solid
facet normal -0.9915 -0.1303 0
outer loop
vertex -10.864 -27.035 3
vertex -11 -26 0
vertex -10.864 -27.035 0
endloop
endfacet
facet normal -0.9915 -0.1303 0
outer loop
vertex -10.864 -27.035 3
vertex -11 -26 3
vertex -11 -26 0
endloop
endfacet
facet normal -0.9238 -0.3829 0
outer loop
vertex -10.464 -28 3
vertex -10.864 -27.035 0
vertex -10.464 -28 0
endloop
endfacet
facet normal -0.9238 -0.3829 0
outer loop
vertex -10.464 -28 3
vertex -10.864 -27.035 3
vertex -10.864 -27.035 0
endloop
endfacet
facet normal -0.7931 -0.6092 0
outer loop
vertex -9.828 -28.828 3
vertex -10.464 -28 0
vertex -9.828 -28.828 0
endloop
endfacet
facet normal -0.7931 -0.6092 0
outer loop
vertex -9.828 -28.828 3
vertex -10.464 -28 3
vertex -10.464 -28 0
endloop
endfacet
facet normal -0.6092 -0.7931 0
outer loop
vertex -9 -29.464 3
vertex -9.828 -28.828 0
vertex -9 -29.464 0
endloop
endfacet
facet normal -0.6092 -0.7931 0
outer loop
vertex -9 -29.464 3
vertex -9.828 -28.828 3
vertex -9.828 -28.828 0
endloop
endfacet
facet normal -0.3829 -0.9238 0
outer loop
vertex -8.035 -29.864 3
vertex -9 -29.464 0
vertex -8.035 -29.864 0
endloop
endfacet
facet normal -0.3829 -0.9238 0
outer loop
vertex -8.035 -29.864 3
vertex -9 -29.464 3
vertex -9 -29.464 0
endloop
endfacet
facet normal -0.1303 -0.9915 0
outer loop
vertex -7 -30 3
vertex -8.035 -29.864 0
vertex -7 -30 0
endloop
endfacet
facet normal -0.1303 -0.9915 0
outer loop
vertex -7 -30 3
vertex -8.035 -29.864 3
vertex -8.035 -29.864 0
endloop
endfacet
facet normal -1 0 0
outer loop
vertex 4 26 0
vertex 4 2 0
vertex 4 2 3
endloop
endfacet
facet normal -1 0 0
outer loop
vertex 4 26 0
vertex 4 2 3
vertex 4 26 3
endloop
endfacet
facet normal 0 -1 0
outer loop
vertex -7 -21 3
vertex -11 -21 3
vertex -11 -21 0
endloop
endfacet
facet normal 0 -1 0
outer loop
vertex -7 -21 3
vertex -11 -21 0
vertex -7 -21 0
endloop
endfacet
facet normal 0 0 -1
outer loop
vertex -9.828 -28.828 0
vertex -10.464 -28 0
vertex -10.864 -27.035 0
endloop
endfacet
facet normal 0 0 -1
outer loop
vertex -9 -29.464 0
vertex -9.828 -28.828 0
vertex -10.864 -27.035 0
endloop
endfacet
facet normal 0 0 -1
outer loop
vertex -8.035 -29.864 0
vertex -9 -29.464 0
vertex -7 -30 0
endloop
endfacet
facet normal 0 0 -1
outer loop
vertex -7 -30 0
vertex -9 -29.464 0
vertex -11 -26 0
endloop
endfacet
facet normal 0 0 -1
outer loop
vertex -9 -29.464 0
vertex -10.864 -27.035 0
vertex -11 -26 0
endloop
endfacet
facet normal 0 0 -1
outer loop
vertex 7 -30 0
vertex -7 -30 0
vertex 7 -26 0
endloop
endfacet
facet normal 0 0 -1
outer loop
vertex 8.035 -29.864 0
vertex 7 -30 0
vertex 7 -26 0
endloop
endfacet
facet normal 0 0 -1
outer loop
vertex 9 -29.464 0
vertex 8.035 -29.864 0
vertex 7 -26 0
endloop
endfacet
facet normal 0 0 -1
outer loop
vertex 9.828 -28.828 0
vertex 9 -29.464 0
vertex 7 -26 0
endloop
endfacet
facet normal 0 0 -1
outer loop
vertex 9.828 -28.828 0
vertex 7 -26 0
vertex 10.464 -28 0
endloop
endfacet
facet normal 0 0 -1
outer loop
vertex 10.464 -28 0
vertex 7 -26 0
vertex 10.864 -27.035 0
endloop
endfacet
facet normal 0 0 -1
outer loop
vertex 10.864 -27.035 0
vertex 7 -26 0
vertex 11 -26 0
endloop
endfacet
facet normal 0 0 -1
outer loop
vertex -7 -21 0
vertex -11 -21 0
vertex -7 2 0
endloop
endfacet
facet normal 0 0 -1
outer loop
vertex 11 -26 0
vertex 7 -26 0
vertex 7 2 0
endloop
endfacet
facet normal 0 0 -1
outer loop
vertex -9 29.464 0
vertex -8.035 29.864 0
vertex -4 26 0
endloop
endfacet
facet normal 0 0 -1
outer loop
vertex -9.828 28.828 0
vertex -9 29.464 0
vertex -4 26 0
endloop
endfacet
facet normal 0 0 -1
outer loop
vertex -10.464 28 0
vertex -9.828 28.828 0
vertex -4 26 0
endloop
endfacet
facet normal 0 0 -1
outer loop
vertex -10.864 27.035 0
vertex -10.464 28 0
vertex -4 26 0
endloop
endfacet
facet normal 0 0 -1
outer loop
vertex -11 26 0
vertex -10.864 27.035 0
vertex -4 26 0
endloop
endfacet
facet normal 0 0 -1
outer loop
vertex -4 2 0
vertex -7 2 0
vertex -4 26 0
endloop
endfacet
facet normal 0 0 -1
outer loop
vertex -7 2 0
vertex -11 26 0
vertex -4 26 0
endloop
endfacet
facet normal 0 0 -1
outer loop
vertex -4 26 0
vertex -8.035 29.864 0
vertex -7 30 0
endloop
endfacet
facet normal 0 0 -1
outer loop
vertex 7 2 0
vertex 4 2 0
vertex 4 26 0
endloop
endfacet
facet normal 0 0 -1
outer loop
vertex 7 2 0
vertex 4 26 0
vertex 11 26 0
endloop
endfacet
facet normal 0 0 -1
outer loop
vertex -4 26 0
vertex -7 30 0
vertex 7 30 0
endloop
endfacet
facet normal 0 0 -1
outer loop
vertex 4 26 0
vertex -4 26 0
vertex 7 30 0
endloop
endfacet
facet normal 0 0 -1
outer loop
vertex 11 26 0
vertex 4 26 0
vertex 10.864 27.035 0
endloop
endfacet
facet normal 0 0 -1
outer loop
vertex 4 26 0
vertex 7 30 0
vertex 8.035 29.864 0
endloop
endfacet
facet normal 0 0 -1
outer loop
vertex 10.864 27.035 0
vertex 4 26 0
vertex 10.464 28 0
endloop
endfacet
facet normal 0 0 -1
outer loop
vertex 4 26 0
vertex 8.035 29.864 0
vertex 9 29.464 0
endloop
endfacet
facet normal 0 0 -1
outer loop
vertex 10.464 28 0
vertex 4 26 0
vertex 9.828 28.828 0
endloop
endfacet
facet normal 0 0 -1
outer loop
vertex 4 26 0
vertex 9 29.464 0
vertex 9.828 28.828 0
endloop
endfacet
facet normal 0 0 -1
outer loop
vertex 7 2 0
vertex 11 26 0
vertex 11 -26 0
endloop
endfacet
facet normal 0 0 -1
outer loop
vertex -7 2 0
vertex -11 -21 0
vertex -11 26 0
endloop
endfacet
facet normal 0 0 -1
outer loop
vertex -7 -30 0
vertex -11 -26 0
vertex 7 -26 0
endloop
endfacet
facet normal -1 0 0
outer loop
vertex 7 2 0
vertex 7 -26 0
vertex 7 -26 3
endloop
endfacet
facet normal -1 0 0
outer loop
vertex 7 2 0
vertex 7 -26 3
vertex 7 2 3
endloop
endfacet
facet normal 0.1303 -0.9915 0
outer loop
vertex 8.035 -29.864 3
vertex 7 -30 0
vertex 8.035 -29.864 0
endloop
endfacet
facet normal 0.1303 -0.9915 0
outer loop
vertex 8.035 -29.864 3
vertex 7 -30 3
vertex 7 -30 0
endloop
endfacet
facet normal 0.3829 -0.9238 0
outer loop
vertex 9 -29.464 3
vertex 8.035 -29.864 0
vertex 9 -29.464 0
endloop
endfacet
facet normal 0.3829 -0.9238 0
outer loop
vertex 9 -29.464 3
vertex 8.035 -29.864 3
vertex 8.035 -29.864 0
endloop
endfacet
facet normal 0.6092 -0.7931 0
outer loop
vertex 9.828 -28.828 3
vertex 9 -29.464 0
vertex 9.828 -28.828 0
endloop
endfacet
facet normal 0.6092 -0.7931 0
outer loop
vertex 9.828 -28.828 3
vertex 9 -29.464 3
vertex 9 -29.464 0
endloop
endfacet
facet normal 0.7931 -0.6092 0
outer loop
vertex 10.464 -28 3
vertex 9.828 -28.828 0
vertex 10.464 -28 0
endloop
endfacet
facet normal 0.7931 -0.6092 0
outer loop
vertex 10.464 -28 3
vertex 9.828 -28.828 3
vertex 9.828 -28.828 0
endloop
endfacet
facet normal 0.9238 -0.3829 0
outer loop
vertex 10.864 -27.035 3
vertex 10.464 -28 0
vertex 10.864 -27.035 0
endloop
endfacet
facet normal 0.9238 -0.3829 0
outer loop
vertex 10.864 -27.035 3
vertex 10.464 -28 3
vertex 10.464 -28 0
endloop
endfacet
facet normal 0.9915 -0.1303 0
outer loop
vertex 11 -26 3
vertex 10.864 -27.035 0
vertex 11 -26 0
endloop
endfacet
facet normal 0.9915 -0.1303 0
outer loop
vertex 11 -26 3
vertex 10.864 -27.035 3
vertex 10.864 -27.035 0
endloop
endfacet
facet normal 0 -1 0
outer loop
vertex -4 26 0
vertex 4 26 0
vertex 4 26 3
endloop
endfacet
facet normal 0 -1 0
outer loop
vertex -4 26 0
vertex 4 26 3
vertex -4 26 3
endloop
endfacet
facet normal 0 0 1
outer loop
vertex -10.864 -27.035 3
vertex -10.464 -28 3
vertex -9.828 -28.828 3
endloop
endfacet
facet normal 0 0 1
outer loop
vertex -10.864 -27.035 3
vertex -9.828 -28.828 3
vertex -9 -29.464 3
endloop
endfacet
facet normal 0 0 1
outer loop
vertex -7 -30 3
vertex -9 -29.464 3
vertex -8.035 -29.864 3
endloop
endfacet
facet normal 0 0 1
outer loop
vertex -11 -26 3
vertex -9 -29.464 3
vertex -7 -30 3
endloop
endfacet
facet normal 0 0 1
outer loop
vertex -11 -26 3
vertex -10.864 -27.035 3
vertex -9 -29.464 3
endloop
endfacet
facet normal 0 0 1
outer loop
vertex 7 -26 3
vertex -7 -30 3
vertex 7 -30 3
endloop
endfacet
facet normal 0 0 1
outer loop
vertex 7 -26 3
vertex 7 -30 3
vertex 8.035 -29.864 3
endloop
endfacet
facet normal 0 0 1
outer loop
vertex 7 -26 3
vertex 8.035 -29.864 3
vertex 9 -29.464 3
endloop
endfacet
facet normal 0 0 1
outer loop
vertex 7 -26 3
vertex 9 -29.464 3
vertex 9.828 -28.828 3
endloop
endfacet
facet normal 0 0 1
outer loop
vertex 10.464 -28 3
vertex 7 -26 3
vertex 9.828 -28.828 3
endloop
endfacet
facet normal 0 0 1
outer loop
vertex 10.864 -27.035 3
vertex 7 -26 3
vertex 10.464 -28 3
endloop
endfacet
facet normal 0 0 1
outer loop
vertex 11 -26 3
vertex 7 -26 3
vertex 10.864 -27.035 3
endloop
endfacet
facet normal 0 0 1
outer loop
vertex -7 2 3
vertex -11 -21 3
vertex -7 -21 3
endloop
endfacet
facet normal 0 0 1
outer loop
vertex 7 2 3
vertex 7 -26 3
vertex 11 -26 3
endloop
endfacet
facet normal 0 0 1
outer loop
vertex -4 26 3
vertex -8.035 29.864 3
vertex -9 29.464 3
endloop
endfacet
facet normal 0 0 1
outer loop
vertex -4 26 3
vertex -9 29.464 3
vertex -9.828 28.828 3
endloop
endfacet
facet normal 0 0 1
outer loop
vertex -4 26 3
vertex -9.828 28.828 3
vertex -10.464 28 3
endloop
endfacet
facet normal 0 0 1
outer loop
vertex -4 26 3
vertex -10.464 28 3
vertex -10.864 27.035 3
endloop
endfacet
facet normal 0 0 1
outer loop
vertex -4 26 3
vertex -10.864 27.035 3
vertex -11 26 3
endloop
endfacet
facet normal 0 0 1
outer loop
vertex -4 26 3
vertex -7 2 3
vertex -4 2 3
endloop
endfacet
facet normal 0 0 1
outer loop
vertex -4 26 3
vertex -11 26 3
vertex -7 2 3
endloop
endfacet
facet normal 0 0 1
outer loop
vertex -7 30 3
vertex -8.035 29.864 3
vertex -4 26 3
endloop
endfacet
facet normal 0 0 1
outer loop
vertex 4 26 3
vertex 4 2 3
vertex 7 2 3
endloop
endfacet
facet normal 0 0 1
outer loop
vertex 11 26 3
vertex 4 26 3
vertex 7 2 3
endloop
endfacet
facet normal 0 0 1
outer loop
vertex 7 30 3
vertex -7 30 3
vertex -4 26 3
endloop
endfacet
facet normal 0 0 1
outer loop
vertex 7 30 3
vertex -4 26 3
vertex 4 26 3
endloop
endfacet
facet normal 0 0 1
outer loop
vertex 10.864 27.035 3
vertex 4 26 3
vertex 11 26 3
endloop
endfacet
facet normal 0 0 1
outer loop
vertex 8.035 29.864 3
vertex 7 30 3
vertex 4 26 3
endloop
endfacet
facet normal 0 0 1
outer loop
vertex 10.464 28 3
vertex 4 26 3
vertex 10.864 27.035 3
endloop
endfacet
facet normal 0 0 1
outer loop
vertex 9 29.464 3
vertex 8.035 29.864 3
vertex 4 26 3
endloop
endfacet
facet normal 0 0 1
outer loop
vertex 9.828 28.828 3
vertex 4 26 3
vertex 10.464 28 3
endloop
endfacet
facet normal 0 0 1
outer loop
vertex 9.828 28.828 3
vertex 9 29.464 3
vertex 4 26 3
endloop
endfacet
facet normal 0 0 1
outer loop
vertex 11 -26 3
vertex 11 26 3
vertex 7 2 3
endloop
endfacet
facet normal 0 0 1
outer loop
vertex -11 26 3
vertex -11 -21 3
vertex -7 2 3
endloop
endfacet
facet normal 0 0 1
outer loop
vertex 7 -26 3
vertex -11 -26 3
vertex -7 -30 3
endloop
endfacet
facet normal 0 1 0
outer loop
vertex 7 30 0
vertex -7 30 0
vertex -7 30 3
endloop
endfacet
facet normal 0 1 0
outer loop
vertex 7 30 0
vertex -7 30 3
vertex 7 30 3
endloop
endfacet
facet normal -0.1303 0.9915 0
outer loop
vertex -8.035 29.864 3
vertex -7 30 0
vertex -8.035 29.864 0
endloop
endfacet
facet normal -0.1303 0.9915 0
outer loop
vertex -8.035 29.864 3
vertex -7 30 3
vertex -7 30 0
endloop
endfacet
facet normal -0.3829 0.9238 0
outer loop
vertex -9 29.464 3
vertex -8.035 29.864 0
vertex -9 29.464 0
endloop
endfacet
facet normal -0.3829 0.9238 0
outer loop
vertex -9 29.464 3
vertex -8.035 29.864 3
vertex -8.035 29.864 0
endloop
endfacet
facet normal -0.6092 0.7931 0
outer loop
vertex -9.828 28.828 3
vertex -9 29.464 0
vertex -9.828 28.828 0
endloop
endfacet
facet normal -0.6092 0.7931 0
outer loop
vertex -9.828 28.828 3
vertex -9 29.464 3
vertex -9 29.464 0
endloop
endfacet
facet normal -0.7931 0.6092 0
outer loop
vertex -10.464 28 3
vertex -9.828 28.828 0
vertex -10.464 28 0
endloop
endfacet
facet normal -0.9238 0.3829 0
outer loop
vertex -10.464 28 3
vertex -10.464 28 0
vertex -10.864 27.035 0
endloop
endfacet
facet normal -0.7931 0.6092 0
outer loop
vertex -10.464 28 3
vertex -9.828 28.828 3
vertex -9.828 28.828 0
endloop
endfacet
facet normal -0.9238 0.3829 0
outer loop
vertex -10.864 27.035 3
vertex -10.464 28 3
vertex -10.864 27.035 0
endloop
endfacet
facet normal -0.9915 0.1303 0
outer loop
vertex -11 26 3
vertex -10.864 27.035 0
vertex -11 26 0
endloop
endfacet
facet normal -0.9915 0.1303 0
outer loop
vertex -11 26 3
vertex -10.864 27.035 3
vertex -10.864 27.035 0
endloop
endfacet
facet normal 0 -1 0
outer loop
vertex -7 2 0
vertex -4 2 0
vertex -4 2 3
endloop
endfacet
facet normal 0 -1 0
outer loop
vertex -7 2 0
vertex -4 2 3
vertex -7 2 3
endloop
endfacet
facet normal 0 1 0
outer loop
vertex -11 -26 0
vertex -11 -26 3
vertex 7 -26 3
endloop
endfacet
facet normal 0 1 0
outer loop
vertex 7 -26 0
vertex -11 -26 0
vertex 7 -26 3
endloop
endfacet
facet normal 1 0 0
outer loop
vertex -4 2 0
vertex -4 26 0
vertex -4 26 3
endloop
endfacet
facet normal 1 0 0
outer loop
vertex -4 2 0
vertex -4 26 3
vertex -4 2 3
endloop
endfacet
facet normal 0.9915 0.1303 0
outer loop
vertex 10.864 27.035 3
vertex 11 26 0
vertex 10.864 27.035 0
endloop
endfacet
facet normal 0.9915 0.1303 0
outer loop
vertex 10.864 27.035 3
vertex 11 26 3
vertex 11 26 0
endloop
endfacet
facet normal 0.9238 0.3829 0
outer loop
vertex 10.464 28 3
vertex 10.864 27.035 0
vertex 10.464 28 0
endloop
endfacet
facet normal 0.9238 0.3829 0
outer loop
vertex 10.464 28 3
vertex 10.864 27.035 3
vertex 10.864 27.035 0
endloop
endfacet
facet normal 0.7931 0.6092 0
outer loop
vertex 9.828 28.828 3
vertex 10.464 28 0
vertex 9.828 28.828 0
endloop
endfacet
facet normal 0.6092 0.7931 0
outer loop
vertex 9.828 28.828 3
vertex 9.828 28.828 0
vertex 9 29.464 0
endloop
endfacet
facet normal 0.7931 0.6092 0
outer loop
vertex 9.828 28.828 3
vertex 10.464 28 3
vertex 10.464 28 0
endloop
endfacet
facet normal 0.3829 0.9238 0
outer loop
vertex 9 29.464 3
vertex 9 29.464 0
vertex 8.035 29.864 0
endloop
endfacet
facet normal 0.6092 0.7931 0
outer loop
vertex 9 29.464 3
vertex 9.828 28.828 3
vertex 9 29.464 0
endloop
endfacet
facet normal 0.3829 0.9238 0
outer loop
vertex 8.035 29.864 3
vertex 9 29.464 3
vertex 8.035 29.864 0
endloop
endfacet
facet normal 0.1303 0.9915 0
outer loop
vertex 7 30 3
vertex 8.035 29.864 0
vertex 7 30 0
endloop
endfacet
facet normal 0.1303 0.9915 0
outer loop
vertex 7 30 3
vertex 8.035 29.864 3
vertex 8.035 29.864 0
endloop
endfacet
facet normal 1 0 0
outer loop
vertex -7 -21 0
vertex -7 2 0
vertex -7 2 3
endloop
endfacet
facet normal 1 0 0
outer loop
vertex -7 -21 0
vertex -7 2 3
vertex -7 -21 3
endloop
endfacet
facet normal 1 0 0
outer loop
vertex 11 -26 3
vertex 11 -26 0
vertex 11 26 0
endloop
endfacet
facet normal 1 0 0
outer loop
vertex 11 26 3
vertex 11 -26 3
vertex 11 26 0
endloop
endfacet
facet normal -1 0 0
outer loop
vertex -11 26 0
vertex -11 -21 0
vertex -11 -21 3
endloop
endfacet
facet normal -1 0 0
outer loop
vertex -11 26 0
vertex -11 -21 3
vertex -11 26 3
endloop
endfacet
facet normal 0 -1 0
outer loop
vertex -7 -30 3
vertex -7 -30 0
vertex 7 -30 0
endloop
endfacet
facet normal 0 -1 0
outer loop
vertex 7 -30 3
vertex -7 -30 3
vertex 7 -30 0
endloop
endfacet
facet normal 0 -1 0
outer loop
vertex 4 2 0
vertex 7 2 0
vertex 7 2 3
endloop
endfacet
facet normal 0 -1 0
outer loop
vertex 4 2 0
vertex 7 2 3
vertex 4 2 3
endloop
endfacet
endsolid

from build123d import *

# Parameters (mm, degrees)
SKETCH_1_W          = 22
SKETCH_1_H          = 60
EXTRUDE_2_DEPTH     = 3
SKETCH_2_W          = 4
SKETCH_2_H          = 5
CUT_EXTRUDE_1_DEPTH = 5
FILLET_1_R          = 4


with BuildPart() as part:
    # Эскиз1 → Бобышка-Вытянуть2 (new body)
    with BuildSketch(Plane.XY):
        Rectangle(SKETCH_1_W, SKETCH_1_H)
        Polygon((4, 26), (-4, 26), (-4, 2), (-7, 2), (-7, -26), (7, -26), (7, 2), (4, 2), align=None, mode=Mode.SUBTRACT)
    extrude(amount=EXTRUDE_2_DEPTH)

    # Эскиз2 → Вырез-Вытянуть1 (cut)
    with BuildSketch(Plane.XY.offset(3)):
        with Locations((-9, -23.5)):
            Rectangle(SKETCH_2_W, SKETCH_2_H)
    extrude(amount=-CUT_EXTRUDE_1_DEPTH, mode=Mode.SUBTRACT)

    # Скругление1
    fillet_1_edges = [part.edges().sort_by_distance(p)[0] for p in [
        (-11, 30, 1.5),
        (11, 30, 1.5),
        (11, -30, 1.5),
        (-11, -30, 1.5),
    ]]
    fillet(fillet_1_edges, radius=FILLET_1_R - 0.0001)  # a hair under: the kernel refuses the full size


solid = part.part
